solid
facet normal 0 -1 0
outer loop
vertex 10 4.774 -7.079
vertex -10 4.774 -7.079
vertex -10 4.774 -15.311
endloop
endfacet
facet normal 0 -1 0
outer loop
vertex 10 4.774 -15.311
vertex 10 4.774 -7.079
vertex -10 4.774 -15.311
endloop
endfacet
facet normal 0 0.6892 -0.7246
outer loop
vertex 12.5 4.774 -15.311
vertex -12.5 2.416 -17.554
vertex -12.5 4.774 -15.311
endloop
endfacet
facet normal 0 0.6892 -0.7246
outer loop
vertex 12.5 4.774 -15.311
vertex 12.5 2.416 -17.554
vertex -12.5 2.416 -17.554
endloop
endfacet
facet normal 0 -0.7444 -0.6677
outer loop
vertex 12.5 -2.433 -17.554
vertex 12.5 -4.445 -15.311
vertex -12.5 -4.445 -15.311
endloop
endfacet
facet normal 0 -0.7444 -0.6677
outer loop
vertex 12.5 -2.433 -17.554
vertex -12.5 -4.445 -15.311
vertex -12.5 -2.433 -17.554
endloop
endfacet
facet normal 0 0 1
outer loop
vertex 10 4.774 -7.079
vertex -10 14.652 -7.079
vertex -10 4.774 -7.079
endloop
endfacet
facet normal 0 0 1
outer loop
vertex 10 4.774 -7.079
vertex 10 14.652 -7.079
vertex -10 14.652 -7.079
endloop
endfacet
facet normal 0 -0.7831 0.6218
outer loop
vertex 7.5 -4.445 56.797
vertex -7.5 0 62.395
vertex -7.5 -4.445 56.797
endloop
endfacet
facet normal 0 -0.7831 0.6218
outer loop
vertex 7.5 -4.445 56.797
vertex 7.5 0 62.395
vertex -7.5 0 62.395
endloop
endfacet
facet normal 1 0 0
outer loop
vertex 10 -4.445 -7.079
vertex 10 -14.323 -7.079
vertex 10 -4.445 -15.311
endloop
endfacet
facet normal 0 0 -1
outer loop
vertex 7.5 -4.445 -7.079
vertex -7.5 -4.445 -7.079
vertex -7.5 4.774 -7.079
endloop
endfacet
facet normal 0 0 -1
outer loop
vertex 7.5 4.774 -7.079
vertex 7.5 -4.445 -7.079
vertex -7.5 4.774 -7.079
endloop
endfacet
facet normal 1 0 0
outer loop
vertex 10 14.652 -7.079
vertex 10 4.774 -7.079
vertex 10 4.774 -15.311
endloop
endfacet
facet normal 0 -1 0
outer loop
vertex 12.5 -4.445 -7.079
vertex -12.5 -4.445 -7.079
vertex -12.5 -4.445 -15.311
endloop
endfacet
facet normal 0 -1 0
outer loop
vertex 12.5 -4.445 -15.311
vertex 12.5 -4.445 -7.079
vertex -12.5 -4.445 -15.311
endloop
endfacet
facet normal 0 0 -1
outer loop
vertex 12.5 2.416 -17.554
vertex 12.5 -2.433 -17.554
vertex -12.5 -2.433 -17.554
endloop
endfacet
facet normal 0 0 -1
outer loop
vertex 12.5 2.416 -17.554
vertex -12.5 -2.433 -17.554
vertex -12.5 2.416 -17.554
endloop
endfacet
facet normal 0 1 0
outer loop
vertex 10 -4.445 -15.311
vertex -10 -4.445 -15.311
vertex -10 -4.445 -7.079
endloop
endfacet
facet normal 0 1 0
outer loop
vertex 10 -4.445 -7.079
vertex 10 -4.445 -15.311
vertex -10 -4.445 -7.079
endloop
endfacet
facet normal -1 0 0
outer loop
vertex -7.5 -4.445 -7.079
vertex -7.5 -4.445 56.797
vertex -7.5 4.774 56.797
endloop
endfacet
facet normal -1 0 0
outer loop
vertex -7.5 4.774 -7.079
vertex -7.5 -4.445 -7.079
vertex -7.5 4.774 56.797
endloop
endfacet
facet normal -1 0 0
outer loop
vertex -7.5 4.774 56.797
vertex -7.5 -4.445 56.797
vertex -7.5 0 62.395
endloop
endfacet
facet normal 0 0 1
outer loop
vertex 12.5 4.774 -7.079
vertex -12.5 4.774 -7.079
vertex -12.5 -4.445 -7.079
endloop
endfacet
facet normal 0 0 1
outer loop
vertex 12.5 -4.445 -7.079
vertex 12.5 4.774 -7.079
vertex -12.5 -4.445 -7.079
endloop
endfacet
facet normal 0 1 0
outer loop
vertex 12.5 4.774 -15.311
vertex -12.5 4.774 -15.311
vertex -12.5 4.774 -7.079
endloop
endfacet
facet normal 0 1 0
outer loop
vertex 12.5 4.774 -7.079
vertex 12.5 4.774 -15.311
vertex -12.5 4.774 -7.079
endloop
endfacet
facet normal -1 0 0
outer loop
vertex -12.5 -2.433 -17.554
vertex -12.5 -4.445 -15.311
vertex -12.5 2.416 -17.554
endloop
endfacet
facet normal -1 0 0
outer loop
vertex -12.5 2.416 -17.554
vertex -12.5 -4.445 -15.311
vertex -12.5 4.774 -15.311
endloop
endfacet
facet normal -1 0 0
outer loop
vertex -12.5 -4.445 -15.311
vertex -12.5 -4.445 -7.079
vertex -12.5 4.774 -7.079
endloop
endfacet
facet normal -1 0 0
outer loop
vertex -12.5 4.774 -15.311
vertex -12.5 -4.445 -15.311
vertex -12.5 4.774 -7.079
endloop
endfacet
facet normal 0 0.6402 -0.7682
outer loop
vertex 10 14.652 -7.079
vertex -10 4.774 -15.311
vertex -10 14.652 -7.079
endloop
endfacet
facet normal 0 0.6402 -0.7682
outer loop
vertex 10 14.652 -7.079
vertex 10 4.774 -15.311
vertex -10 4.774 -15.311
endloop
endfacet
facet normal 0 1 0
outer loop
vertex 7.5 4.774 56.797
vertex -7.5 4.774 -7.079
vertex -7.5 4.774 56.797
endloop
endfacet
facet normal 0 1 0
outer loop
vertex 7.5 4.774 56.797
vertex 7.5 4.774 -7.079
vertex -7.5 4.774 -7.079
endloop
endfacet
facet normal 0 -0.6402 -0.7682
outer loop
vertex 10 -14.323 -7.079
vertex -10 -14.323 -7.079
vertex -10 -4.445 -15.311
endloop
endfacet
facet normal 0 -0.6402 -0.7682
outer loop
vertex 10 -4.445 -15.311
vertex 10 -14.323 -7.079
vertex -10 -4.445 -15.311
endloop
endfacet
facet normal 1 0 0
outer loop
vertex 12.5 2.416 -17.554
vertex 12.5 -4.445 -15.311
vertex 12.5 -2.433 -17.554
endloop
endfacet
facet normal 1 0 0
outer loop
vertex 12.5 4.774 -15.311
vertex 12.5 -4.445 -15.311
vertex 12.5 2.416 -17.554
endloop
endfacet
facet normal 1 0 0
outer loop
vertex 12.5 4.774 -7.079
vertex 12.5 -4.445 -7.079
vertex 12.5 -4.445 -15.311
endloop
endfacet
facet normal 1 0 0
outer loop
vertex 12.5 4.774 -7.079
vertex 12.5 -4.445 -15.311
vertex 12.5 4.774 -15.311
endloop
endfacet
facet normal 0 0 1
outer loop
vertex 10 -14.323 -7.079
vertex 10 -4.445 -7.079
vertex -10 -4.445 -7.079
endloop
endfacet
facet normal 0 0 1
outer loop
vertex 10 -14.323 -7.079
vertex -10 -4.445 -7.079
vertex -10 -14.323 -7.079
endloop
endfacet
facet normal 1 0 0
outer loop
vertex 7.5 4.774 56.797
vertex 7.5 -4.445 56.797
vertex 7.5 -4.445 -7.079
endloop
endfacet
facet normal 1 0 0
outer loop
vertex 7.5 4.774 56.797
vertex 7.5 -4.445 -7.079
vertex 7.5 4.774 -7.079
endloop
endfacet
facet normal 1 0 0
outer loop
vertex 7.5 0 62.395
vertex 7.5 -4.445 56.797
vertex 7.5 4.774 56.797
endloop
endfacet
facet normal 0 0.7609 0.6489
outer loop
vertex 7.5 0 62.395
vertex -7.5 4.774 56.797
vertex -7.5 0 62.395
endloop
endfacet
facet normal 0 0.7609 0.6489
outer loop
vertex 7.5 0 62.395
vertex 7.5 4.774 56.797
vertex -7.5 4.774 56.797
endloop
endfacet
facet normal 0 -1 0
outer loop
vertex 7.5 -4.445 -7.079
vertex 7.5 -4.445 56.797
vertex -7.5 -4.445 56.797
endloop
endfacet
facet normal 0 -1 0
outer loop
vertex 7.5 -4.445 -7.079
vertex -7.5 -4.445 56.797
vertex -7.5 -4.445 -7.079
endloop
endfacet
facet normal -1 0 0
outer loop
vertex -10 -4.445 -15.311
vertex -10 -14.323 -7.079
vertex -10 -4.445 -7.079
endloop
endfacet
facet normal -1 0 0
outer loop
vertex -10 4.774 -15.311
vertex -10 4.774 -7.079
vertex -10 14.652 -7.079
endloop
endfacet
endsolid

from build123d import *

# Parameters (mm, degrees)
F1_DEPTH = 7.5
F2_DEPTH = 10
F3_DEPTH = 12.5


with BuildPart() as f1:
    # F0 (on Right) → F1 (new body, symmetric)
    with BuildSketch(Plane.YZ):
        Polygon((0, 62.39463), (-4.444998, 56.797221), (-4.444998, -7.079074), (4.774259, -7.079074), (4.774259, 56.797221), align=None)
    extrude(amount=F1_DEPTH, both=True)


with BuildPart() as f2:
    # F0 (on Right) → F2 (new body, symmetric)
    with BuildSketch(Plane.YZ):
        Polygon((-4.444998, -15.310556), (-4.444998, -7.079074), (-14.322778, -7.079074), align=None)
        Polygon((14.652036, -7.079074), (4.774259, -7.079074), (4.774259, -15.310556), align=None)
    extrude(amount=F2_DEPTH, both=True)


with BuildPart() as f3:
    # F0 (on Right) → F3 (new body, symmetric)
    with BuildSketch(Plane.YZ):
        Polygon((4.774259, -7.079074), (-4.444998, -7.079074), (-4.444998, -15.310556), (-2.432911, -17.554464), (2.416329, -17.554464), (4.774259, -15.310556), align=None)
    extrude(amount=F3_DEPTH, both=True)


solid = Compound([f1.part, f2.part, f3.part])
